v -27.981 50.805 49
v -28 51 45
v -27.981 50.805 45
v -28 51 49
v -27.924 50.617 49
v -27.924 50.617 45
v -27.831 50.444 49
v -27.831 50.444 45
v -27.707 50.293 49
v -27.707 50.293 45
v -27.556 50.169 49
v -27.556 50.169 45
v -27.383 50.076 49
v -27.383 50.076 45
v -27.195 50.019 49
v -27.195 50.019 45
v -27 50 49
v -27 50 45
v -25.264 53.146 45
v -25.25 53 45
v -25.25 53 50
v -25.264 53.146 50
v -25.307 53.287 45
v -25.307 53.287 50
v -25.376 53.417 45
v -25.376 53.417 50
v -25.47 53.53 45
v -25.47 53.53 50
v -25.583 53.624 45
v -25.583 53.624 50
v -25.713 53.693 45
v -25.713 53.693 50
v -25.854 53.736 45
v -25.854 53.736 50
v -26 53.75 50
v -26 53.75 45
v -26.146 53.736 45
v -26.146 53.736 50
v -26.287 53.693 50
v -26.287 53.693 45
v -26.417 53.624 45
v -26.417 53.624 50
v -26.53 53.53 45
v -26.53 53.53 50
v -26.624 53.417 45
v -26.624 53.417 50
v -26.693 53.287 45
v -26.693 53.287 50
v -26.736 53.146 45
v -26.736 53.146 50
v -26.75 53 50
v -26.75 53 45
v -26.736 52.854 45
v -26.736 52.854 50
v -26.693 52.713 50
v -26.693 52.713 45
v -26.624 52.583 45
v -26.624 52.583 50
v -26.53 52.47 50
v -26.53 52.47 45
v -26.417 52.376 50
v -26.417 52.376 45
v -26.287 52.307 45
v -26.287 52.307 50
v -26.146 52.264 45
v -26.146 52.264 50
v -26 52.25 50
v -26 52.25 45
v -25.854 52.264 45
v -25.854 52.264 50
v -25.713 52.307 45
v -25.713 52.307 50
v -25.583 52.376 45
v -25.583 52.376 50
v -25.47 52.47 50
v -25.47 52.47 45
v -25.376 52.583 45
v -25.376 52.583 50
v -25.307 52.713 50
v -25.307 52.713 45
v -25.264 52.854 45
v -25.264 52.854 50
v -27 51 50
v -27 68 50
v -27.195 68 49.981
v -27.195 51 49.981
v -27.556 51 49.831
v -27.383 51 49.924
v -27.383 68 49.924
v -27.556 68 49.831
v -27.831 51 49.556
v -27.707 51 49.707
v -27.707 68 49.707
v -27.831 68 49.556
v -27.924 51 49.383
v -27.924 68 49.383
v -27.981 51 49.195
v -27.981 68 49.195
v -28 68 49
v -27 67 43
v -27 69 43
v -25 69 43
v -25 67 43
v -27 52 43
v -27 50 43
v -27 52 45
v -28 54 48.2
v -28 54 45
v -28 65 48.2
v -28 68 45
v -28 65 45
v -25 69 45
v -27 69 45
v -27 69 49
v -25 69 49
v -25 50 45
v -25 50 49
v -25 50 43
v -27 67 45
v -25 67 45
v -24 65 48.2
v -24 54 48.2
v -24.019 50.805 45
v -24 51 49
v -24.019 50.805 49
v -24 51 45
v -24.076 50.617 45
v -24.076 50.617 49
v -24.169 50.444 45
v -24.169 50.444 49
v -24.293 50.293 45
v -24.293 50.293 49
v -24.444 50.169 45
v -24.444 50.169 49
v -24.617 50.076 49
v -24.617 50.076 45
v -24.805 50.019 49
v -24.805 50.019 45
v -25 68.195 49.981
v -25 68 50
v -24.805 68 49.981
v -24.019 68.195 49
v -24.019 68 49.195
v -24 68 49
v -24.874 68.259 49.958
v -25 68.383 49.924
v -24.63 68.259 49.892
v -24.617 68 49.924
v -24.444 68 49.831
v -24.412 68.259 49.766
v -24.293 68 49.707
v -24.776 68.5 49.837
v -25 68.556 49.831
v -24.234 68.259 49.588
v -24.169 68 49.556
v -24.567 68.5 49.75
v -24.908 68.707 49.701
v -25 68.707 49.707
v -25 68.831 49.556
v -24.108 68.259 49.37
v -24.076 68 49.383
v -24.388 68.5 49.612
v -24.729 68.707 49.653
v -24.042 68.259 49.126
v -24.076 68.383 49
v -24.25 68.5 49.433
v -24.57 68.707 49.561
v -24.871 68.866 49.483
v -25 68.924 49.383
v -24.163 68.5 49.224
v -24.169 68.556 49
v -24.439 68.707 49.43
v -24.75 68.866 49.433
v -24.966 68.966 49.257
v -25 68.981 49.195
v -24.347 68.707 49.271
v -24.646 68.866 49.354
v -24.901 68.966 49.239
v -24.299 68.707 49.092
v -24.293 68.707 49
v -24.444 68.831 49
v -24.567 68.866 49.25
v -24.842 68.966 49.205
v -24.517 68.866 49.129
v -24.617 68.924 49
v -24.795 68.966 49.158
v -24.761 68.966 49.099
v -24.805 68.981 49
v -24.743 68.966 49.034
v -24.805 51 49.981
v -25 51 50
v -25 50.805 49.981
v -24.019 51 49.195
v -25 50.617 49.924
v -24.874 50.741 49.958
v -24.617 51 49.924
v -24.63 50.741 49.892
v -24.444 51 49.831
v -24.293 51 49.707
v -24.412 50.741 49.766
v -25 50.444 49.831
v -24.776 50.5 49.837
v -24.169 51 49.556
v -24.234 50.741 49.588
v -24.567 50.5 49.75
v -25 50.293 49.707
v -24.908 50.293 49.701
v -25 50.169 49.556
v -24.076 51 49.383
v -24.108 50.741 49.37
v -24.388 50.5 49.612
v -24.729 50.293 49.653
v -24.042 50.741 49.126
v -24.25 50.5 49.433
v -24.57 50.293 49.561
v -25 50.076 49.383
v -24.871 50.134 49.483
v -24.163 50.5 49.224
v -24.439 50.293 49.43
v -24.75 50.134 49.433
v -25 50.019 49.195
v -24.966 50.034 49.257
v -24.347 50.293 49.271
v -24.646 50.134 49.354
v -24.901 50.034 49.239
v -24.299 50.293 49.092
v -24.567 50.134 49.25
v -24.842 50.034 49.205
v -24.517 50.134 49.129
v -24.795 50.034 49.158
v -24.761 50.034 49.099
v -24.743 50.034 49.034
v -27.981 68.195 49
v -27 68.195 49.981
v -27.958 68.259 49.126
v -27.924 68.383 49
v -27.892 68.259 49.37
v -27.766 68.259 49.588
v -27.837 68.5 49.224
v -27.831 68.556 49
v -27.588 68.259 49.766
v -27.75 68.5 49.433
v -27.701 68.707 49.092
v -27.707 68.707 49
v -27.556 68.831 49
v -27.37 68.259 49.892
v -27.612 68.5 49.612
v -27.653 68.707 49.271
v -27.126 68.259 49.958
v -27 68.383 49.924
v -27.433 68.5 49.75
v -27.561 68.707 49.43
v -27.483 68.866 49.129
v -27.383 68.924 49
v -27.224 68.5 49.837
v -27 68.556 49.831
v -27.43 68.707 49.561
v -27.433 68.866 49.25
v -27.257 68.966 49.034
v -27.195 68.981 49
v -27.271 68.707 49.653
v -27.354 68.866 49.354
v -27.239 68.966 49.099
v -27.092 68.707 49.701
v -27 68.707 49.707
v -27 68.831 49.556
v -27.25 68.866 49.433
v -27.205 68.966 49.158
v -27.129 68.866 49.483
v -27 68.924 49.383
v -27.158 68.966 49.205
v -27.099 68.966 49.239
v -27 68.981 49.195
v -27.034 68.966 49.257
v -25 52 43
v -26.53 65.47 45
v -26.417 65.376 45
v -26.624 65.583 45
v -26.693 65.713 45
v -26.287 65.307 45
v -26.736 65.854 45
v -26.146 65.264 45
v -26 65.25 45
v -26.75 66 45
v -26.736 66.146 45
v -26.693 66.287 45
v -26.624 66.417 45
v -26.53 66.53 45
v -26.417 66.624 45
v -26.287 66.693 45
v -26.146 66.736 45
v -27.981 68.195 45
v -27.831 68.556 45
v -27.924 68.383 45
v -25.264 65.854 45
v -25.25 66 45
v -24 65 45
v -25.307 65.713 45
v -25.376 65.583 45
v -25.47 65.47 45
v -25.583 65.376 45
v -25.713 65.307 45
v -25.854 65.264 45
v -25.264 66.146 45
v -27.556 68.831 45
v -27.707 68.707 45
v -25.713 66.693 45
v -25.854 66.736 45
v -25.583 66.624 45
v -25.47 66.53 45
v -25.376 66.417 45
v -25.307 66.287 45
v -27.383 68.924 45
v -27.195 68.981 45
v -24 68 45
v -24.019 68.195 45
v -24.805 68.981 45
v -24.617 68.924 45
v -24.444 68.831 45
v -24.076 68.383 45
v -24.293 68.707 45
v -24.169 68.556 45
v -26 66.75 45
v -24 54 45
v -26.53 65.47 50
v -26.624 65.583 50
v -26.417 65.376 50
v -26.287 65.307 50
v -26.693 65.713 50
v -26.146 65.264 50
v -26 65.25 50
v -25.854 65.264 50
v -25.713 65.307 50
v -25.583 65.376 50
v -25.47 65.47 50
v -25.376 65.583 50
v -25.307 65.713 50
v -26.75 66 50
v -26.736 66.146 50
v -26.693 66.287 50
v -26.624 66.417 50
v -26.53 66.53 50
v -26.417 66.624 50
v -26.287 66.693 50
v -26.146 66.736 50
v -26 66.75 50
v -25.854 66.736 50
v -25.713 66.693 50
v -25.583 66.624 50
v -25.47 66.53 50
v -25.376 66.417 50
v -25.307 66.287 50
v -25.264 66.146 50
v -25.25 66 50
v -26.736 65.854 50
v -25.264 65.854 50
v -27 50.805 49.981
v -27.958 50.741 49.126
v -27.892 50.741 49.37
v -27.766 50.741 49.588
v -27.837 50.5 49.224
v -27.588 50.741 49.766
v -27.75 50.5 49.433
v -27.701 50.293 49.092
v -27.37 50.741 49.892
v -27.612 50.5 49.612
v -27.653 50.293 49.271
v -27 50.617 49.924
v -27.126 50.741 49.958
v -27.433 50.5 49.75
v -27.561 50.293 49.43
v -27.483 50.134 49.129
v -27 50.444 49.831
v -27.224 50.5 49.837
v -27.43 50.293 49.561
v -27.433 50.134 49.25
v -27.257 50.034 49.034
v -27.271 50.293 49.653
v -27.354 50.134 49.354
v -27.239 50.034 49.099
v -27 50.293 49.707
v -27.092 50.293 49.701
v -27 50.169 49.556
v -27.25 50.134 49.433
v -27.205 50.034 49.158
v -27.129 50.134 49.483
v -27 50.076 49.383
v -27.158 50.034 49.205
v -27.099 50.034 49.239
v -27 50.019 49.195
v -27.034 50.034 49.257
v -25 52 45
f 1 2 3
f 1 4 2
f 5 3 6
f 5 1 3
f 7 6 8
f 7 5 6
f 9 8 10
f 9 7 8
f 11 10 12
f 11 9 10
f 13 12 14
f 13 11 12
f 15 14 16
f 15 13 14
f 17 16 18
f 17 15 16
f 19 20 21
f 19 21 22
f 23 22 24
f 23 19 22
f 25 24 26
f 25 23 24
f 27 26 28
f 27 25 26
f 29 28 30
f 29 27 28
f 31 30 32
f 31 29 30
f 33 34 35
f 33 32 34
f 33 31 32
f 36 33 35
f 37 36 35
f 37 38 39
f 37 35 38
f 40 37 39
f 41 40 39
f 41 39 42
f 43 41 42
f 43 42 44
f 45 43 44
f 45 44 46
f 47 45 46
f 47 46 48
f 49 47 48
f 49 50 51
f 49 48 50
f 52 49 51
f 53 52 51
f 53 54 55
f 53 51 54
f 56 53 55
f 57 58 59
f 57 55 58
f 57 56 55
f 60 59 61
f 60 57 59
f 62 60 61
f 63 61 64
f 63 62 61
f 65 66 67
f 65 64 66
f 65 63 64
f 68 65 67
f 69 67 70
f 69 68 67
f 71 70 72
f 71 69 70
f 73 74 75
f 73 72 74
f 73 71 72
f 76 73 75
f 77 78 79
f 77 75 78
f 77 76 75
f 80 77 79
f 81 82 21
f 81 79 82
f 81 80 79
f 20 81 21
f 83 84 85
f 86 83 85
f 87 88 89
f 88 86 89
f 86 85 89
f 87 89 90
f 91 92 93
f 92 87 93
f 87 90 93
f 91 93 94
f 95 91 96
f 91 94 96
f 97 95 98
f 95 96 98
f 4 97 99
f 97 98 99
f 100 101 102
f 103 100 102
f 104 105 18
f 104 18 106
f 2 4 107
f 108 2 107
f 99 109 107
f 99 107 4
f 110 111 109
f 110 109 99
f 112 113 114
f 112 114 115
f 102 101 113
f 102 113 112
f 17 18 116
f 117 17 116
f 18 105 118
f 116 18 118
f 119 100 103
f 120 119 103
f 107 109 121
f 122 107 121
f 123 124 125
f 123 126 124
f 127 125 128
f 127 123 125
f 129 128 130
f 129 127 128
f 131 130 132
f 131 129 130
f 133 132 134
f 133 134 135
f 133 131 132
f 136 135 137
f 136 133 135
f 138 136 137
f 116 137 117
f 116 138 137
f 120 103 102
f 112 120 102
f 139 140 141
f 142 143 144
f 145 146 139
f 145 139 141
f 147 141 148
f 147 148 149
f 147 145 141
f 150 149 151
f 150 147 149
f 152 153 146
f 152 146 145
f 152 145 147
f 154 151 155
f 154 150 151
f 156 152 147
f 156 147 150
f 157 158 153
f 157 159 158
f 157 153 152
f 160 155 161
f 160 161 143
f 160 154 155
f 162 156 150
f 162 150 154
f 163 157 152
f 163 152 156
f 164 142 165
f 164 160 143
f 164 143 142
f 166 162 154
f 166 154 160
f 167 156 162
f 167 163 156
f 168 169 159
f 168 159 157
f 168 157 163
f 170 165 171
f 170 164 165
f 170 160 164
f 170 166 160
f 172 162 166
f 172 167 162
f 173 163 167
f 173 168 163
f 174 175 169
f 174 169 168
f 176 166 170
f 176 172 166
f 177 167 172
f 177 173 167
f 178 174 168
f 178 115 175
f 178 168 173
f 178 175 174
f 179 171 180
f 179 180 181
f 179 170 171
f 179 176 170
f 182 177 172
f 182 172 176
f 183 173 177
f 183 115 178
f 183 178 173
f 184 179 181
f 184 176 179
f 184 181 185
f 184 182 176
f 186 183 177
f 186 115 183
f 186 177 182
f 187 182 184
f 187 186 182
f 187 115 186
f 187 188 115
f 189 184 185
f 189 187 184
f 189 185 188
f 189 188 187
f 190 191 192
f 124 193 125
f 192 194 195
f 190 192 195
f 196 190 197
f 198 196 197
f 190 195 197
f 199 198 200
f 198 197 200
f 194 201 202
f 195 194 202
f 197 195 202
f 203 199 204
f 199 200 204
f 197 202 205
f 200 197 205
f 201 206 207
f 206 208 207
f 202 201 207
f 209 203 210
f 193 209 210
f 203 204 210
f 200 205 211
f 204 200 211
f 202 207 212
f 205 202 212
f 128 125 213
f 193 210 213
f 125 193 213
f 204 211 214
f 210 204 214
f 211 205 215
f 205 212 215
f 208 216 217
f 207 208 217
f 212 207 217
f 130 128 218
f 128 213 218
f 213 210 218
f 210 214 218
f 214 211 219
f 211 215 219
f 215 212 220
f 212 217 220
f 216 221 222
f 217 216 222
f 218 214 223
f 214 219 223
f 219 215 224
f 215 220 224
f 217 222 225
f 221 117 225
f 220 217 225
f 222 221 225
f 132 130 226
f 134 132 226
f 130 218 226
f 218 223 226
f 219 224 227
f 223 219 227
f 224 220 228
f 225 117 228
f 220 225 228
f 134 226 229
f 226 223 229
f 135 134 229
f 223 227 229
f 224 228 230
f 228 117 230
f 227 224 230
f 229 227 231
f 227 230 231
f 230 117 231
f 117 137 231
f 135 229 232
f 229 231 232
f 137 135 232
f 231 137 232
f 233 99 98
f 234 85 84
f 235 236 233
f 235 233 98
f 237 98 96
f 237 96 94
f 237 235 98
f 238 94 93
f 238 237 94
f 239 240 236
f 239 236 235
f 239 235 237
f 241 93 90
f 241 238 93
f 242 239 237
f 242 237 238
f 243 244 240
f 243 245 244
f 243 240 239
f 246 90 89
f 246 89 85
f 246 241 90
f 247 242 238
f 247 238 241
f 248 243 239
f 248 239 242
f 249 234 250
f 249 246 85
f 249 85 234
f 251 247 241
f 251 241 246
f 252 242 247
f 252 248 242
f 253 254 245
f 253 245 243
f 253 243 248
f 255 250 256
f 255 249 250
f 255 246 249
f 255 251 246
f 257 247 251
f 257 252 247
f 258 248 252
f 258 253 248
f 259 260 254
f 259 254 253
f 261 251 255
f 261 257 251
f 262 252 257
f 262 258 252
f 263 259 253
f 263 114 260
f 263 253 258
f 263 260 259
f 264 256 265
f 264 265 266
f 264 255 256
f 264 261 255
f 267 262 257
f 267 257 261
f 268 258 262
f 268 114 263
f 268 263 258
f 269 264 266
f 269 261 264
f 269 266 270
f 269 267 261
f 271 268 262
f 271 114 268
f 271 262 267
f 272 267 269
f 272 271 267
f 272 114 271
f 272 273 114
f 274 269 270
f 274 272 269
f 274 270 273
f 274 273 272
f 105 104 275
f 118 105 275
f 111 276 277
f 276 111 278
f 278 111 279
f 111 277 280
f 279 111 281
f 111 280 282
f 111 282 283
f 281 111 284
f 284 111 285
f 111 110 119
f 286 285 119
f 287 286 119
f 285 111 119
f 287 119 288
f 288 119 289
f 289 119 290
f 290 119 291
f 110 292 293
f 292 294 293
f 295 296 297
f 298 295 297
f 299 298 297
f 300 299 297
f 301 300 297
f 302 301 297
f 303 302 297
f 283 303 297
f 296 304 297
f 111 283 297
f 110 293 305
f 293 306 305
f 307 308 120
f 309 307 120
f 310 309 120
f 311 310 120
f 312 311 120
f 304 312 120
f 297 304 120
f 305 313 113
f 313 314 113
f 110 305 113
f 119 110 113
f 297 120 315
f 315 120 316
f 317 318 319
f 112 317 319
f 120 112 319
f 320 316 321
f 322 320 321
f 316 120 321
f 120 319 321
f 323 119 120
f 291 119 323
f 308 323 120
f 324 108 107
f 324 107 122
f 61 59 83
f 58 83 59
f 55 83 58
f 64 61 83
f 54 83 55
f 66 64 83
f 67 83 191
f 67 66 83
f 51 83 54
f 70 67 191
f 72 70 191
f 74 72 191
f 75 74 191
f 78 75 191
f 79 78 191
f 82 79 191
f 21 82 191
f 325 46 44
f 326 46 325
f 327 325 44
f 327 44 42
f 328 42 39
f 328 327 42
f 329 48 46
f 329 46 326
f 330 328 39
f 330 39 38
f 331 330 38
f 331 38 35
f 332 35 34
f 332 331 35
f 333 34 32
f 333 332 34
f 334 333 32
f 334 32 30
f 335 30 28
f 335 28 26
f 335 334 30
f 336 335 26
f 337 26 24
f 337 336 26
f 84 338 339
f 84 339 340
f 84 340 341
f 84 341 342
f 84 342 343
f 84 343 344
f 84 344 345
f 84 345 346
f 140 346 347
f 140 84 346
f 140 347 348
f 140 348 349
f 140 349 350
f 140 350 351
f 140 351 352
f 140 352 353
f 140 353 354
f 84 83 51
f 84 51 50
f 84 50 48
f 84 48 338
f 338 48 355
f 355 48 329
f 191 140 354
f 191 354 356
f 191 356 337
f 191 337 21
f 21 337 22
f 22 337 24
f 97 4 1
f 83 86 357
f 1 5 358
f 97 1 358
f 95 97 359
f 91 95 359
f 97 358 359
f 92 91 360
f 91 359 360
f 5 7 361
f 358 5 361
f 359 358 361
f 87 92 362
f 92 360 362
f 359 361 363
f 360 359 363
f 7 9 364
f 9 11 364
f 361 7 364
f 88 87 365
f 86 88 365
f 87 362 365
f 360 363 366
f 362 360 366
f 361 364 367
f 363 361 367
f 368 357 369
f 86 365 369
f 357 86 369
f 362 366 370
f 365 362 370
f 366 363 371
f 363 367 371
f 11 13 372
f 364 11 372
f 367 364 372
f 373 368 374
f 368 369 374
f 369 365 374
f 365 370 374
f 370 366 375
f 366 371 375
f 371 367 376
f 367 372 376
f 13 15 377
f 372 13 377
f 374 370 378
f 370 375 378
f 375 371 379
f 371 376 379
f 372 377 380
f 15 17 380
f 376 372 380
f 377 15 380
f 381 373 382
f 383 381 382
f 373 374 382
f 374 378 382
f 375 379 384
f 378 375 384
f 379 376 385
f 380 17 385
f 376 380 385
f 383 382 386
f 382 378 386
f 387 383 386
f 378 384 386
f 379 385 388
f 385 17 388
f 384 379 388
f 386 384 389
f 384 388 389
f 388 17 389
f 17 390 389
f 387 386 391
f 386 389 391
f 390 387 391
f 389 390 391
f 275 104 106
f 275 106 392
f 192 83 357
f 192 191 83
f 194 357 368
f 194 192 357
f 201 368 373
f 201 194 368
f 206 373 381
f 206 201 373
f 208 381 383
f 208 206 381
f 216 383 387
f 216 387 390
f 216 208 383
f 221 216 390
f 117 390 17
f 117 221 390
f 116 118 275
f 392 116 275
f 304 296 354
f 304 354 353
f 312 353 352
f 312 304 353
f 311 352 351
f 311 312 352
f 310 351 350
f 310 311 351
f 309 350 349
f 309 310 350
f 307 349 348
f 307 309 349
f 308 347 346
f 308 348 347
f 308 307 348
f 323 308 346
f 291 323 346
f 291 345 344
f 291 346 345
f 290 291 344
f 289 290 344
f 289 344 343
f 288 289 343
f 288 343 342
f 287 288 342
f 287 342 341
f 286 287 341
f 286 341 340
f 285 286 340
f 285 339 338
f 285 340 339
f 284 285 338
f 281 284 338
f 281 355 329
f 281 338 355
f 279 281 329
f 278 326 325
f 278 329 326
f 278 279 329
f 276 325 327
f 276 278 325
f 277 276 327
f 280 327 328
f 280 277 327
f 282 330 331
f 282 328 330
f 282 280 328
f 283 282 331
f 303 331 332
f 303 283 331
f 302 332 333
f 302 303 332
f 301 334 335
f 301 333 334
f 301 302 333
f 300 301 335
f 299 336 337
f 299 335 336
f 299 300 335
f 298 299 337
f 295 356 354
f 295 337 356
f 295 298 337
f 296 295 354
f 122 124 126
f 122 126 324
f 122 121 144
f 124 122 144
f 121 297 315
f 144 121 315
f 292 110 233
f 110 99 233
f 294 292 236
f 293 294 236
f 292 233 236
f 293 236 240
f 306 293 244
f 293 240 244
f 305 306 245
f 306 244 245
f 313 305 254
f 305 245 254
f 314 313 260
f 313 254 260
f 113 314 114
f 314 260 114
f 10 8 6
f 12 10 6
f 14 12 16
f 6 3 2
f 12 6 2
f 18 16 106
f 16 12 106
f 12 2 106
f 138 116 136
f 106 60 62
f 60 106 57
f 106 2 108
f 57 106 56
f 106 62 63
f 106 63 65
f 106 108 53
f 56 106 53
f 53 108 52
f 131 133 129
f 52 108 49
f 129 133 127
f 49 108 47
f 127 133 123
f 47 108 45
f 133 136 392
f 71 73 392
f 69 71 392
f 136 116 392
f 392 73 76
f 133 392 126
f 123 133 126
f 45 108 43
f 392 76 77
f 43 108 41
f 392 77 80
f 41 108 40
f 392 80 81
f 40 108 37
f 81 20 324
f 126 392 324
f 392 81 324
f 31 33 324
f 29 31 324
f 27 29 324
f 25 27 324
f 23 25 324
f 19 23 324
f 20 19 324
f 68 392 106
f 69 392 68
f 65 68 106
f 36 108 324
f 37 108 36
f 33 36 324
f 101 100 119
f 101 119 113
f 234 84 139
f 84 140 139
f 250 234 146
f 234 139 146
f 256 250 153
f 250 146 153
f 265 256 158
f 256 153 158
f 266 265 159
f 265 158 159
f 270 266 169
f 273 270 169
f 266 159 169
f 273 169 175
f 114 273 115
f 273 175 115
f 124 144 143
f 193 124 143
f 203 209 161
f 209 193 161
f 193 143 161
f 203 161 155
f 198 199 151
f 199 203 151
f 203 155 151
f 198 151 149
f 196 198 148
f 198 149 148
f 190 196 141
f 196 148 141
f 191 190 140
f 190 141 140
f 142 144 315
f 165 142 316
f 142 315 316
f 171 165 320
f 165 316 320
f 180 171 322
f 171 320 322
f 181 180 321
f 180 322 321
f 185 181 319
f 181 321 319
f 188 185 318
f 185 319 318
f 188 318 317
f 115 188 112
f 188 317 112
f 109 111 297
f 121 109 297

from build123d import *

# Parameters (mm, degrees)
BOX069_W          = 2
BOX069_H          = 2
BOX069_DEPTH      = 2
BOX070_W          = 2
BOX070_H          = 2
BOX070_DEPTH      = 2
CYLINDER040_R     = 0.75
CYLINDER040_DEPTH = 10
CYLINDER037_R     = 0.75
CYLINDER037_DEPTH = 10
BOX038_W          = 5
BOX038_H          = 11
BOX038_DEPTH      = 3.2
BOX003_W          = 4
BOX003_H          = 19
BOX003_DEPTH      = 5
FILLET_R          = 1
FILLET001_R       = 1
FILLET002_R       = 1
FILLET003_R       = 1


with BuildPart() as cubo069:
    # Box069 → Box069 (new body)
    with BuildSketch(Plane(origin=(-27, 67, 43), x_dir=(1, 0, 0), z_dir=(0, 0, 1))):
        with Locations((1, 1)):
            Rectangle(BOX069_W, BOX069_H)
    extrude(amount=BOX069_DEPTH)


with BuildPart() as cubo070:
    # Box070 → Box070 (new body)
    with BuildSketch(Plane(origin=(-27, 50, 43), x_dir=(1, 0, 0), z_dir=(0, 0, 1))):
        with Locations((1, 1)):
            Rectangle(BOX070_W, BOX070_H)
    extrude(amount=BOX070_DEPTH)


with BuildPart() as cilindro040:
    # Cylinder040 → Cylinder040 (new body)
    with BuildSketch(Plane(origin=(-26, 66, 42), x_dir=(1, 0, 0), z_dir=(0, 0, 1))):
        Circle(CYLINDER040_R)
    extrude(amount=CYLINDER040_DEPTH)


with BuildPart() as cilindro037:
    # Cylinder037 → Cylinder037 (new body)
    with BuildSketch(Plane(origin=(-26, 53, 42), x_dir=(1, 0, 0), z_dir=(0, 0, 1))):
        Circle(CYLINDER037_R)
    extrude(amount=CYLINDER037_DEPTH)


with BuildPart() as cubo038:
    # Box038 → Box038 (new body)
    with BuildSketch(Plane(origin=(-28.5, 54, 51), x_dir=(1, 0, 0), z_dir=(0, 0, 1))):
        with Locations((2.5, 5.5)):
            Rectangle(BOX038_W, BOX038_H)
    extrude(amount=BOX038_DEPTH)


with BuildPart() as fusion002044002:
    # Box003 → Box003 (new body)
    with BuildSketch(Plane(origin=(-2, 50, 45), x_dir=(1, 0, 0), z_dir=(0, 0, 1))):
        with Locations((2, 9.5)):
            Rectangle(BOX003_W, BOX003_H)
    extrude(amount=BOX003_DEPTH)

    # Fillet
    fillet_edges = [fusion002044002.edges().sort_by_distance(p)[0] for p in [
        (2, 59.5, 50),
    ]]
    fillet(fillet_edges, radius=FILLET_R)

    # Fillet001
    fillet001_edges = [fusion002044002.edges().sort_by_distance(p)[0] for p in [
        (-2, 59.5, 50),
    ]]
    fillet(fillet001_edges, radius=FILLET001_R)

    # Fillet002
    fillet002_edges = [fusion002044002.edges().sort_by_distance(p)[0] for p in [
        (0, 69, 50),
    ]]
    fillet(fillet002_edges, radius=FILLET002_R)

    # Fillet003
    fillet003_edges = [fusion002044002.edges().sort_by_distance(p)[0] for p in [
        (0, 50, 50),
    ]]
    fillet(fillet003_edges, radius=FILLET003_R)


with BuildPart() as fusion002044002_1:
    # Fillet003 placement: moved
    add(fusion002044002.part.moved(Location((-26, 0, 6))))

    # Cut055: cut Cubo038
    add(cubo038.part, mode=Mode.SUBTRACT)


with BuildPart() as fusion002044002_2:
    # Cut055 placement: moved
    add(fusion002044002_1.part.moved(Location((0, 0, -6))))

    # Cut057: cut Cilindro037
    add(cilindro037.part, mode=Mode.SUBTRACT)

    # Cut058: cut Cilindro040
    add(cilindro040.part, mode=Mode.SUBTRACT)

    # Fusion002044002: union Cubo069, Cubo070
    add(cubo069.part)
    add(cubo070.part)


solid = fusion002044002_2.part
